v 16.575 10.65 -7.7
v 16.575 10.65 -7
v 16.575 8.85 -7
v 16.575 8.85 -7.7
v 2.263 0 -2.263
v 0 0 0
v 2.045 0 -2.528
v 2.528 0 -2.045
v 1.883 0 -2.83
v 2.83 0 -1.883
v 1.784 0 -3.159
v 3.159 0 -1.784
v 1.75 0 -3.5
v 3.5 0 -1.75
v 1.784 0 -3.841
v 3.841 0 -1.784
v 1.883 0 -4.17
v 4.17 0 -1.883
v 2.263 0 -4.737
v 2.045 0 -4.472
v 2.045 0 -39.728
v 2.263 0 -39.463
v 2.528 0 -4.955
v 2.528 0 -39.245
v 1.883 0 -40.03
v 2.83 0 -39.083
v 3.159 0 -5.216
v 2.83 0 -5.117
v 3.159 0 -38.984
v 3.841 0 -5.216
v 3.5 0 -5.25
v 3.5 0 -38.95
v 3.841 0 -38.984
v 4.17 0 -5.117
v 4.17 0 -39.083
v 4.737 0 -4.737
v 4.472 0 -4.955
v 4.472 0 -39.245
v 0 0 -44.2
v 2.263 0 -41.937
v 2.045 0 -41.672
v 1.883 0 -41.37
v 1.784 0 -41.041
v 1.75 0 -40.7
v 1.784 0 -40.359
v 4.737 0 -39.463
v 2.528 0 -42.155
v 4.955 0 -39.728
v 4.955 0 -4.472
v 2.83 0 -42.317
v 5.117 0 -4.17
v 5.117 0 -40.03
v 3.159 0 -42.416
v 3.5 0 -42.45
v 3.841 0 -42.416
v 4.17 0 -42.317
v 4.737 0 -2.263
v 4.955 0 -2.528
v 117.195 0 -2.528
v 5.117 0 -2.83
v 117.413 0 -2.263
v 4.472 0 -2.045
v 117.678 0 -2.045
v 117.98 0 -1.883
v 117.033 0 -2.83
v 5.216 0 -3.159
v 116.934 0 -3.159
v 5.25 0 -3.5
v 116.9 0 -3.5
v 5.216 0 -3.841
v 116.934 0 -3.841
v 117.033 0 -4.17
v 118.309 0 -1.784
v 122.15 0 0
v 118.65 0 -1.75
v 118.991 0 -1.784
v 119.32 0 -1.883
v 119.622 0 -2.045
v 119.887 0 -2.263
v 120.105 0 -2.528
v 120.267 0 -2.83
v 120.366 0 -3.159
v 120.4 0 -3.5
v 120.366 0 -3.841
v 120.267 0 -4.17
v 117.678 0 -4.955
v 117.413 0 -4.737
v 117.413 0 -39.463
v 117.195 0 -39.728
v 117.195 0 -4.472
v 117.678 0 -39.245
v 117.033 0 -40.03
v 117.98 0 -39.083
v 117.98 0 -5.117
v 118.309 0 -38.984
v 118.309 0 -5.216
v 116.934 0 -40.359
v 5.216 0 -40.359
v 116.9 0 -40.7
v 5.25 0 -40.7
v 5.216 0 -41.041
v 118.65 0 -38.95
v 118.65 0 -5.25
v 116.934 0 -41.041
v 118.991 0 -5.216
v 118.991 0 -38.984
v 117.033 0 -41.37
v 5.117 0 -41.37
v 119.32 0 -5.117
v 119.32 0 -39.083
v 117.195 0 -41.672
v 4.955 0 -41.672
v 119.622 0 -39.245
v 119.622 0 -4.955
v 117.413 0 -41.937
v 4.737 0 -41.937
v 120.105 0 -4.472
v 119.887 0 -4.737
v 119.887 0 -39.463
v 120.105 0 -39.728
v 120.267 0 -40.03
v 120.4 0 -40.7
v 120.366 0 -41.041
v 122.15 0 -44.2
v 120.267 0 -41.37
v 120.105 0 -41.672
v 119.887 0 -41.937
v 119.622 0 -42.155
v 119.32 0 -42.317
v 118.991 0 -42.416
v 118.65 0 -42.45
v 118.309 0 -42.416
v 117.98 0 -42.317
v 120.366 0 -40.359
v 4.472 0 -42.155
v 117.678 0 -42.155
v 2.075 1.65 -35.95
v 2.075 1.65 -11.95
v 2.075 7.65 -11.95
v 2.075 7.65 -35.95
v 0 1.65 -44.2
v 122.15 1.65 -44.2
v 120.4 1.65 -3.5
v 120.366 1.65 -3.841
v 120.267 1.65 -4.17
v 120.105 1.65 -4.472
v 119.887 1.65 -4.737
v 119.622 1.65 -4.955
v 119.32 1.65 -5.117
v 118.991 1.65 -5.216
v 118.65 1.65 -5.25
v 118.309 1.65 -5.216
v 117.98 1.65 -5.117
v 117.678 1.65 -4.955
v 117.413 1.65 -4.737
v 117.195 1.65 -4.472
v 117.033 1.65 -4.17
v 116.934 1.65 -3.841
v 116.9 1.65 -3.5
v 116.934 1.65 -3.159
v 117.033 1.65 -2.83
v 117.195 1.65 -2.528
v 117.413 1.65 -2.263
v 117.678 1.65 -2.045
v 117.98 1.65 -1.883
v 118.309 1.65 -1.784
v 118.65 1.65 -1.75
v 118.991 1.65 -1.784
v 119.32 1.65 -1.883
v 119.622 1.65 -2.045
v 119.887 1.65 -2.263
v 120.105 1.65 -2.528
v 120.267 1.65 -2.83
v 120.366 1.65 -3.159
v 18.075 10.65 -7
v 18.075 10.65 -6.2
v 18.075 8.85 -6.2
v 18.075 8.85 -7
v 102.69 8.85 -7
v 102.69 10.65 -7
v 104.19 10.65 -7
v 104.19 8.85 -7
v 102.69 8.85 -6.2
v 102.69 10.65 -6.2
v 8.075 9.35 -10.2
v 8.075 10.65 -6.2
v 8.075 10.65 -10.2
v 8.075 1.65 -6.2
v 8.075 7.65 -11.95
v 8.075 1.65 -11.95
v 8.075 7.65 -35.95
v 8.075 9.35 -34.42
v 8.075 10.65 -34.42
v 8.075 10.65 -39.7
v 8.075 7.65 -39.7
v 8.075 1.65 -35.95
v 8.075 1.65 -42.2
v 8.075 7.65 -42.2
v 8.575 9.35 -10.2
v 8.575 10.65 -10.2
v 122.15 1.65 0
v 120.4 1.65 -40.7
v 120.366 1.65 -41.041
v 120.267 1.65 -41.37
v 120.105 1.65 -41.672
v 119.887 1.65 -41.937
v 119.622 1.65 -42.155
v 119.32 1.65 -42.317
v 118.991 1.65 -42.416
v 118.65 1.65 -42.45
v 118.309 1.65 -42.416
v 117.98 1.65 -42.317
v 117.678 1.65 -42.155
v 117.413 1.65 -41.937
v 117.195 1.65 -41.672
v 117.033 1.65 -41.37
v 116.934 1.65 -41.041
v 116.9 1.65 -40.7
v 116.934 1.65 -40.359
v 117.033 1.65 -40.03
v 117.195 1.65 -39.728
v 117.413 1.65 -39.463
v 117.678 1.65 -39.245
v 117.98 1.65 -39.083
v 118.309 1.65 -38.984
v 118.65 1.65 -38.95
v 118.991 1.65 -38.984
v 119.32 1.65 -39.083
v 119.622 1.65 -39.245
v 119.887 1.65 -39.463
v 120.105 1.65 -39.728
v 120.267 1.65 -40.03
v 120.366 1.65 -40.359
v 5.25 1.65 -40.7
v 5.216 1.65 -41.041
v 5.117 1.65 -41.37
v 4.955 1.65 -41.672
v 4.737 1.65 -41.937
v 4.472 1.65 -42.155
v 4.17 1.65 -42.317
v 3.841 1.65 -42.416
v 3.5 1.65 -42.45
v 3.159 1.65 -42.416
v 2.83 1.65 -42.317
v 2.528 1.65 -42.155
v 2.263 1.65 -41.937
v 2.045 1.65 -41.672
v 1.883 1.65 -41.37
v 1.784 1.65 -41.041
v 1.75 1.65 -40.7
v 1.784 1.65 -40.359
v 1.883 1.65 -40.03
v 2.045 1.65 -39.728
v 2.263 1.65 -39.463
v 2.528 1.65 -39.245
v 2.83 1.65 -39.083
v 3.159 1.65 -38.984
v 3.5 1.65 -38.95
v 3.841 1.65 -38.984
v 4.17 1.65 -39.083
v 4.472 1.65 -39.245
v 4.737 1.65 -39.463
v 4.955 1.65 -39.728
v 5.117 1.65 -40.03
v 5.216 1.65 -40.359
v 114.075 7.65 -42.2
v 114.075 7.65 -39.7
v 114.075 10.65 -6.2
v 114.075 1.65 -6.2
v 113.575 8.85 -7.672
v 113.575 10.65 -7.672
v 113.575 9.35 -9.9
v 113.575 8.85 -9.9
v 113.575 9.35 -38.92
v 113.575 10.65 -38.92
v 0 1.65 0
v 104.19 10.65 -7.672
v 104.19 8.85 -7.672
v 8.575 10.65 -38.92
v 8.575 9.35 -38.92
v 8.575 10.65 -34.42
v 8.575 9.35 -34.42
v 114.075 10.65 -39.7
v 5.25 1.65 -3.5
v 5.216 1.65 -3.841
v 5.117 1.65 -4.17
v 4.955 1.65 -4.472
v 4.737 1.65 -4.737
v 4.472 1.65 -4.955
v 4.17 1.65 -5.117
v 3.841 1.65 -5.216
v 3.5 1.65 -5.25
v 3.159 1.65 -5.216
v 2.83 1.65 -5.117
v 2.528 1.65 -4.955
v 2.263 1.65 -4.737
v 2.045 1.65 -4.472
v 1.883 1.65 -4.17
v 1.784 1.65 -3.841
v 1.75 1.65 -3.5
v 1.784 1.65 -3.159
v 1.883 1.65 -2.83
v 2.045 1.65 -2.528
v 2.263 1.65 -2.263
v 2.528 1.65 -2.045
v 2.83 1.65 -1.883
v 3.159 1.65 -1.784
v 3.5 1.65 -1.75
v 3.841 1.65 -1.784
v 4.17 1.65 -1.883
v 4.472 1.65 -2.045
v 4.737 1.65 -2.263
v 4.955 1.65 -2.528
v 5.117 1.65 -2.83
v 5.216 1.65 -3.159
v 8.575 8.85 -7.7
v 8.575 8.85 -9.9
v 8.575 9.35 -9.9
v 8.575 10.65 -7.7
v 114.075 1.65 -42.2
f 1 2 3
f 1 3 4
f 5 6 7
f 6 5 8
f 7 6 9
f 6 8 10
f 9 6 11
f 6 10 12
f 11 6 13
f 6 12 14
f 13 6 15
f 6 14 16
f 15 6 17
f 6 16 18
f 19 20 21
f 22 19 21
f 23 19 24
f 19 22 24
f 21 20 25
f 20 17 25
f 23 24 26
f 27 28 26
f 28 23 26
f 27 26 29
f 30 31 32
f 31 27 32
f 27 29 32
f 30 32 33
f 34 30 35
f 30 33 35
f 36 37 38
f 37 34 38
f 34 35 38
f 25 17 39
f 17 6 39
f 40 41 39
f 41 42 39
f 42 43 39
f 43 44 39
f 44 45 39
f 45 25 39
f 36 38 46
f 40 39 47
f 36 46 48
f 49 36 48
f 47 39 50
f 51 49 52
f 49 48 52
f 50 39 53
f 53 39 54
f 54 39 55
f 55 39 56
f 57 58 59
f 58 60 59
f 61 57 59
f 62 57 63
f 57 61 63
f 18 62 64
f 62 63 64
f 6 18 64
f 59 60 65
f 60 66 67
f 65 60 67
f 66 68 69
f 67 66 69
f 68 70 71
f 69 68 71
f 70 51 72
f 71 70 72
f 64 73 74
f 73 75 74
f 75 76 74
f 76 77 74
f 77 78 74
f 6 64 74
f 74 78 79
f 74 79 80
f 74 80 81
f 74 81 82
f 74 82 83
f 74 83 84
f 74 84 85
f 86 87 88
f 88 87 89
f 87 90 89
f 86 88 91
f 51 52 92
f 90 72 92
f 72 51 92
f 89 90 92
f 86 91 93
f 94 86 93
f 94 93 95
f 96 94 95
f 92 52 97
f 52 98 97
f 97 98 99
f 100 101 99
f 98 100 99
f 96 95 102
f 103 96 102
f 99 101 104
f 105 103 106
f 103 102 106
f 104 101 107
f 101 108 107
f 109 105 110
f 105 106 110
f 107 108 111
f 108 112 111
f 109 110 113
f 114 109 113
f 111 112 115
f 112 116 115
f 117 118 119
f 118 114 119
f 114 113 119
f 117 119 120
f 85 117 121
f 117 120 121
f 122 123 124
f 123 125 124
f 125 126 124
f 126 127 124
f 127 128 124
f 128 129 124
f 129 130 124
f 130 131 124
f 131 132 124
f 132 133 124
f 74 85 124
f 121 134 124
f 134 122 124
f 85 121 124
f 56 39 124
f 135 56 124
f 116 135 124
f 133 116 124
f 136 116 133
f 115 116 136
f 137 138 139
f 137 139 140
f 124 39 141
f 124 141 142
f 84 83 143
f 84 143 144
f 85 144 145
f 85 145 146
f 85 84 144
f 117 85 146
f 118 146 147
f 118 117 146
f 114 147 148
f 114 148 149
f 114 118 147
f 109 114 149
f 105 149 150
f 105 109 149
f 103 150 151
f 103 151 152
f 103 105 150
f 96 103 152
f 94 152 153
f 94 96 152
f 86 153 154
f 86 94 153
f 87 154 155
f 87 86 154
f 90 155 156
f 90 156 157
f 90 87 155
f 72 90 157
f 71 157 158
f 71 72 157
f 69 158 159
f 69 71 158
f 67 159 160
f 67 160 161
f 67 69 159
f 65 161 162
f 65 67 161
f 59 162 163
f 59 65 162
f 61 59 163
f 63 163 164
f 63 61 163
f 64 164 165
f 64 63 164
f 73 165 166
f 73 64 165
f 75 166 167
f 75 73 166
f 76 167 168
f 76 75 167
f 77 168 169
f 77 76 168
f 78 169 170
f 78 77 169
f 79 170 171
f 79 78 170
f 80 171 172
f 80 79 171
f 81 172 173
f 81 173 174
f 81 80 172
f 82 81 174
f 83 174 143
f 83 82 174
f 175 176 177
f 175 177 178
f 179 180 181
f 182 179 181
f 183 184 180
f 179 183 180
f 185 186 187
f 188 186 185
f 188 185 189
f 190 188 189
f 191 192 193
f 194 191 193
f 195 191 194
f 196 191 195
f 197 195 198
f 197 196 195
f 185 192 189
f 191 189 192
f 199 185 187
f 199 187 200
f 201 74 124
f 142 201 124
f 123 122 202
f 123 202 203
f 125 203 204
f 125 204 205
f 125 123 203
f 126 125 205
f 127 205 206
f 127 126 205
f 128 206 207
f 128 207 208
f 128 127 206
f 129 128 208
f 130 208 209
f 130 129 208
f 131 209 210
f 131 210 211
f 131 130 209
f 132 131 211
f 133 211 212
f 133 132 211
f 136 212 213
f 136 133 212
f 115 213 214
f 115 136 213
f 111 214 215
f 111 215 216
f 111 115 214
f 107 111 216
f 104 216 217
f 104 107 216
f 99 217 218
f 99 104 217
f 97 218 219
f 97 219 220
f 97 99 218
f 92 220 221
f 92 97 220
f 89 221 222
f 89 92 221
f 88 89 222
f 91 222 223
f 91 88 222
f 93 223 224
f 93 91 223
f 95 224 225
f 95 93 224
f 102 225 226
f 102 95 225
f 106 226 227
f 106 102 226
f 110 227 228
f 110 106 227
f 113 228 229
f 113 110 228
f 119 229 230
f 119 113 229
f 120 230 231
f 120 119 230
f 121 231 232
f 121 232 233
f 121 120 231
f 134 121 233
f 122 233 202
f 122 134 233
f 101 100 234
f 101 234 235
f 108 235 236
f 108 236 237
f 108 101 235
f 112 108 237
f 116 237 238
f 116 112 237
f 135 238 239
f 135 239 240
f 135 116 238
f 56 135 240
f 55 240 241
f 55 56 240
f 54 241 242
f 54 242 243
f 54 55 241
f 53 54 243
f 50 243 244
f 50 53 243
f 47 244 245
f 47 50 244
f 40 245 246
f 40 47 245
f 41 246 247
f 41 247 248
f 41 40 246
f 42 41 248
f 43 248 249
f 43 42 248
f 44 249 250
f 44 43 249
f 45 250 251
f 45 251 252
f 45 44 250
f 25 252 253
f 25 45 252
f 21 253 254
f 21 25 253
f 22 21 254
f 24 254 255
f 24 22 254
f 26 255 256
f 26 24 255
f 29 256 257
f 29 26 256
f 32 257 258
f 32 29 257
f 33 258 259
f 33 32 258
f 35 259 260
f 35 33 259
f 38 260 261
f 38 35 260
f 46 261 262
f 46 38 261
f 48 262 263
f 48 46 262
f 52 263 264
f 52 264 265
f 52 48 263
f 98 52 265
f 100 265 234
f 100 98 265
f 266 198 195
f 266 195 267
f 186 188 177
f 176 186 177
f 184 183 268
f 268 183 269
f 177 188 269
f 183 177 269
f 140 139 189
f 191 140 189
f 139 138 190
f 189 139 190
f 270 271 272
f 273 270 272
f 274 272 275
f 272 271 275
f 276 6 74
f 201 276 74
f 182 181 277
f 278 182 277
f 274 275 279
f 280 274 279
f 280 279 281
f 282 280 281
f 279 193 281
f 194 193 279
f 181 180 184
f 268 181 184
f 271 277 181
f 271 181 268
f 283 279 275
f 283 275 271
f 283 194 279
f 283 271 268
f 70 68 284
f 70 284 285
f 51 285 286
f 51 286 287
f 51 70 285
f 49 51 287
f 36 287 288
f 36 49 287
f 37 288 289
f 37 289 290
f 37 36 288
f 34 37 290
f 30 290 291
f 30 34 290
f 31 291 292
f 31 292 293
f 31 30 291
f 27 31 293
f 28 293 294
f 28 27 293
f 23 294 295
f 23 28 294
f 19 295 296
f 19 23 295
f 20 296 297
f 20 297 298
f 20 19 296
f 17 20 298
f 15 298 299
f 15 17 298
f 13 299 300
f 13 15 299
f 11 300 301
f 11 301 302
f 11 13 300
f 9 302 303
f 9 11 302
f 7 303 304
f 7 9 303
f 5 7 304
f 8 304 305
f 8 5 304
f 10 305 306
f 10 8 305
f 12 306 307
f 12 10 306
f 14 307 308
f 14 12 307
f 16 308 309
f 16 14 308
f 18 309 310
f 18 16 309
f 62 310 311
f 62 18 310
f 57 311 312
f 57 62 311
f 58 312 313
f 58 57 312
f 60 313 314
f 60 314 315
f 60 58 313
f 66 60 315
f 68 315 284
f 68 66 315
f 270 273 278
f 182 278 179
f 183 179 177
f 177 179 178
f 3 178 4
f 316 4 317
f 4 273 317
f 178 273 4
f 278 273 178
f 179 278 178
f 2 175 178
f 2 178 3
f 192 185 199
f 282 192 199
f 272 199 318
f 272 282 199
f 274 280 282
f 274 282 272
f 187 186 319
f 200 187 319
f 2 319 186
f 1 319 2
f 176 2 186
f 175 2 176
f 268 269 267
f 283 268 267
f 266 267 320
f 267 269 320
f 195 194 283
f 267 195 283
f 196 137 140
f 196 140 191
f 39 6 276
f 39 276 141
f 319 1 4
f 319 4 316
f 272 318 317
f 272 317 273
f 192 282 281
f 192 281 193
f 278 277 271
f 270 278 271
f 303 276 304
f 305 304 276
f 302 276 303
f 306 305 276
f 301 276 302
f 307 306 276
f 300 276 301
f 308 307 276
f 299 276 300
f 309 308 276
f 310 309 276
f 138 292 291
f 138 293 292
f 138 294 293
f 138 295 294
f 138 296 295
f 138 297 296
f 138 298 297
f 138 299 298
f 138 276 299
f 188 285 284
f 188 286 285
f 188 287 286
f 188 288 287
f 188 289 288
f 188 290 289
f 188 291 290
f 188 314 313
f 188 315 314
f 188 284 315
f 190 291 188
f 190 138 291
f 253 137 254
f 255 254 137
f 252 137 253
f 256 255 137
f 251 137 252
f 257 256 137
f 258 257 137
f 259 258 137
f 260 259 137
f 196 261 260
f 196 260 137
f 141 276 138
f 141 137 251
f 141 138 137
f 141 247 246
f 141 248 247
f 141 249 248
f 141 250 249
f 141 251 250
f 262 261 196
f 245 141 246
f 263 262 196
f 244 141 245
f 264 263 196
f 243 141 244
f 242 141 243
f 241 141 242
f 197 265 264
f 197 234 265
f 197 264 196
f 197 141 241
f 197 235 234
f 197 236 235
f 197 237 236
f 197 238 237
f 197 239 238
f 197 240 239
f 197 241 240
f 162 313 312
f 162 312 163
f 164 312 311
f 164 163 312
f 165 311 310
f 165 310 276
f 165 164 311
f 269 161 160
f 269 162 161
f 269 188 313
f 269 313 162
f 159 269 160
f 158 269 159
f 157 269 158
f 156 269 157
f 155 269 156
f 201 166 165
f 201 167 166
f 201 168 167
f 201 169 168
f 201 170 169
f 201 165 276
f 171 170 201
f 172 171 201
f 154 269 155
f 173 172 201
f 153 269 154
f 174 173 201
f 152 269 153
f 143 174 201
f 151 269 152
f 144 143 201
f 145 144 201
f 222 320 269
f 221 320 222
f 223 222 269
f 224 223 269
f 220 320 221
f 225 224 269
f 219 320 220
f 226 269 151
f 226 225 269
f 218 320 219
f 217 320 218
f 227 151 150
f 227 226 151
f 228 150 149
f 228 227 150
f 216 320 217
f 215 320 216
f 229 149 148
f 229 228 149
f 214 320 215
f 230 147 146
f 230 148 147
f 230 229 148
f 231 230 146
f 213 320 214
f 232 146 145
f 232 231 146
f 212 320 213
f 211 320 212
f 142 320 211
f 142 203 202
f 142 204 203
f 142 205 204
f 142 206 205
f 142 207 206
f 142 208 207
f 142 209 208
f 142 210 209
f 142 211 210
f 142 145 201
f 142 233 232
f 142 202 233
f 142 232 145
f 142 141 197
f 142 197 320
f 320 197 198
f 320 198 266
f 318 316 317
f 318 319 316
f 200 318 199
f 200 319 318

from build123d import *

# Parameters (mm, degrees)
SKETCH1_W           = 122.15
SKETCH1_H           = 44.2
SKETCH1_R           = 1.75
BOSS_EXTRUDE1_DEPTH = 1.65
SKETCH2_W           = 106
SKETCH2_H           = 36
BOSS_EXTRUDE2_DEPTH = 9
SKETCH3_W           = 106
SKETCH3_H           = 2.5
CUT_EXTRUDE1_DEPTH  = 3
CUT_EXTRUDE2_DEPTH  = 1.3
SKETCH5_W           = 6
SKETCH5_H           = 24
BOSS_EXTRUDE3_DEPTH = 6
CUT_EXTRUDE3_DEPTH  = 0.5


with BuildPart() as part:
    # Sketch1 → Boss-Extrude1 (new body)
    with BuildSketch(Plane(origin=(0, 0, 0), x_dir=(1, 0, 0), z_dir=(0, 1, 0))):
        with Locations((61.075, 22.1)):
            Rectangle(SKETCH1_W, SKETCH1_H)
        with Locations((3.5, 40.7)):
            Circle(SKETCH1_R, mode=Mode.SUBTRACT)
        with Locations((3.5, 3.5)):
            Circle(SKETCH1_R, mode=Mode.SUBTRACT)
        with Locations((118.65, 3.5)):
            Circle(SKETCH1_R, mode=Mode.SUBTRACT)
        with Locations((118.65, 40.7)):
            Circle(SKETCH1_R, mode=Mode.SUBTRACT)
    extrude(amount=BOSS_EXTRUDE1_DEPTH)

    # Sketch2 → Boss-Extrude2 (add)
    with BuildSketch(Plane(origin=(0, 1.65, 0), x_dir=(1, 0, 0), z_dir=(0, 1, 0))):
        with Locations((61.075, 24.2)):
            Rectangle(SKETCH2_W, SKETCH2_H)
    extrude(amount=BOSS_EXTRUDE2_DEPTH)

    # Sketch3 → Cut-Extrude1 (cut)
    with BuildSketch(Plane(origin=(0, 10.65, 0), x_dir=(1, 0, 0), z_dir=(0, 1, 0))):
        with Locations((61.075, 40.95)):
            Rectangle(SKETCH3_W, SKETCH3_H)
    extrude(amount=-CUT_EXTRUDE1_DEPTH, mode=Mode.SUBTRACT)

    # Sketch4 → Cut-Extrude2 (cut)
    with BuildSketch(Plane(origin=(0, 10.65, 0), x_dir=(1, 0, 0), z_dir=(0, 1, 0))):
        Polygon((16.575, 7.7), (16.575, 7), (18.075, 7), (18.075, 6.2), (102.68965461, 6.2), (102.68965461, 7), (104.18965461, 7), (104.18965461, 7.672103119), (113.575, 7.672103119), (113.575, 38.92), (8.575, 38.92), (8.575, 34.42), (8.075, 34.42), (8.075, 10.2), (8.575, 10.2), (8.575, 7.7), align=None)
    extrude(amount=-CUT_EXTRUDE2_DEPTH, mode=Mode.SUBTRACT)

    # Sketch5 → Boss-Extrude3 (add)
    with BuildSketch(Plane(origin=(0, 1.65, 0), x_dir=(1, 0, 0), z_dir=(0, 1, 0))):
        with Locations((5.075, 23.95)):
            Rectangle(SKETCH5_W, SKETCH5_H)
    extrude(amount=BOSS_EXTRUDE3_DEPTH)

    # Sketch6 → Cut-Extrude3 (cut)
    with BuildSketch(Plane(origin=(0, 9.35, 0), x_dir=(1, 0, 0), z_dir=(0, 1, 0))):
        Polygon((8.575, 7.7), (8.575, 9.9), (113.575, 9.9), (113.575, 7.672103119), (104.18965461, 7.672103119), (104.18965461, 7), (102.68965461, 7), (102.68965461, 6.2), (18.075, 6.2), (18.075, 7), (16.575, 7), (16.575, 7.7), align=None)
    extrude(amount=-CUT_EXTRUDE3_DEPTH, mode=Mode.SUBTRACT)


solid = part.part
